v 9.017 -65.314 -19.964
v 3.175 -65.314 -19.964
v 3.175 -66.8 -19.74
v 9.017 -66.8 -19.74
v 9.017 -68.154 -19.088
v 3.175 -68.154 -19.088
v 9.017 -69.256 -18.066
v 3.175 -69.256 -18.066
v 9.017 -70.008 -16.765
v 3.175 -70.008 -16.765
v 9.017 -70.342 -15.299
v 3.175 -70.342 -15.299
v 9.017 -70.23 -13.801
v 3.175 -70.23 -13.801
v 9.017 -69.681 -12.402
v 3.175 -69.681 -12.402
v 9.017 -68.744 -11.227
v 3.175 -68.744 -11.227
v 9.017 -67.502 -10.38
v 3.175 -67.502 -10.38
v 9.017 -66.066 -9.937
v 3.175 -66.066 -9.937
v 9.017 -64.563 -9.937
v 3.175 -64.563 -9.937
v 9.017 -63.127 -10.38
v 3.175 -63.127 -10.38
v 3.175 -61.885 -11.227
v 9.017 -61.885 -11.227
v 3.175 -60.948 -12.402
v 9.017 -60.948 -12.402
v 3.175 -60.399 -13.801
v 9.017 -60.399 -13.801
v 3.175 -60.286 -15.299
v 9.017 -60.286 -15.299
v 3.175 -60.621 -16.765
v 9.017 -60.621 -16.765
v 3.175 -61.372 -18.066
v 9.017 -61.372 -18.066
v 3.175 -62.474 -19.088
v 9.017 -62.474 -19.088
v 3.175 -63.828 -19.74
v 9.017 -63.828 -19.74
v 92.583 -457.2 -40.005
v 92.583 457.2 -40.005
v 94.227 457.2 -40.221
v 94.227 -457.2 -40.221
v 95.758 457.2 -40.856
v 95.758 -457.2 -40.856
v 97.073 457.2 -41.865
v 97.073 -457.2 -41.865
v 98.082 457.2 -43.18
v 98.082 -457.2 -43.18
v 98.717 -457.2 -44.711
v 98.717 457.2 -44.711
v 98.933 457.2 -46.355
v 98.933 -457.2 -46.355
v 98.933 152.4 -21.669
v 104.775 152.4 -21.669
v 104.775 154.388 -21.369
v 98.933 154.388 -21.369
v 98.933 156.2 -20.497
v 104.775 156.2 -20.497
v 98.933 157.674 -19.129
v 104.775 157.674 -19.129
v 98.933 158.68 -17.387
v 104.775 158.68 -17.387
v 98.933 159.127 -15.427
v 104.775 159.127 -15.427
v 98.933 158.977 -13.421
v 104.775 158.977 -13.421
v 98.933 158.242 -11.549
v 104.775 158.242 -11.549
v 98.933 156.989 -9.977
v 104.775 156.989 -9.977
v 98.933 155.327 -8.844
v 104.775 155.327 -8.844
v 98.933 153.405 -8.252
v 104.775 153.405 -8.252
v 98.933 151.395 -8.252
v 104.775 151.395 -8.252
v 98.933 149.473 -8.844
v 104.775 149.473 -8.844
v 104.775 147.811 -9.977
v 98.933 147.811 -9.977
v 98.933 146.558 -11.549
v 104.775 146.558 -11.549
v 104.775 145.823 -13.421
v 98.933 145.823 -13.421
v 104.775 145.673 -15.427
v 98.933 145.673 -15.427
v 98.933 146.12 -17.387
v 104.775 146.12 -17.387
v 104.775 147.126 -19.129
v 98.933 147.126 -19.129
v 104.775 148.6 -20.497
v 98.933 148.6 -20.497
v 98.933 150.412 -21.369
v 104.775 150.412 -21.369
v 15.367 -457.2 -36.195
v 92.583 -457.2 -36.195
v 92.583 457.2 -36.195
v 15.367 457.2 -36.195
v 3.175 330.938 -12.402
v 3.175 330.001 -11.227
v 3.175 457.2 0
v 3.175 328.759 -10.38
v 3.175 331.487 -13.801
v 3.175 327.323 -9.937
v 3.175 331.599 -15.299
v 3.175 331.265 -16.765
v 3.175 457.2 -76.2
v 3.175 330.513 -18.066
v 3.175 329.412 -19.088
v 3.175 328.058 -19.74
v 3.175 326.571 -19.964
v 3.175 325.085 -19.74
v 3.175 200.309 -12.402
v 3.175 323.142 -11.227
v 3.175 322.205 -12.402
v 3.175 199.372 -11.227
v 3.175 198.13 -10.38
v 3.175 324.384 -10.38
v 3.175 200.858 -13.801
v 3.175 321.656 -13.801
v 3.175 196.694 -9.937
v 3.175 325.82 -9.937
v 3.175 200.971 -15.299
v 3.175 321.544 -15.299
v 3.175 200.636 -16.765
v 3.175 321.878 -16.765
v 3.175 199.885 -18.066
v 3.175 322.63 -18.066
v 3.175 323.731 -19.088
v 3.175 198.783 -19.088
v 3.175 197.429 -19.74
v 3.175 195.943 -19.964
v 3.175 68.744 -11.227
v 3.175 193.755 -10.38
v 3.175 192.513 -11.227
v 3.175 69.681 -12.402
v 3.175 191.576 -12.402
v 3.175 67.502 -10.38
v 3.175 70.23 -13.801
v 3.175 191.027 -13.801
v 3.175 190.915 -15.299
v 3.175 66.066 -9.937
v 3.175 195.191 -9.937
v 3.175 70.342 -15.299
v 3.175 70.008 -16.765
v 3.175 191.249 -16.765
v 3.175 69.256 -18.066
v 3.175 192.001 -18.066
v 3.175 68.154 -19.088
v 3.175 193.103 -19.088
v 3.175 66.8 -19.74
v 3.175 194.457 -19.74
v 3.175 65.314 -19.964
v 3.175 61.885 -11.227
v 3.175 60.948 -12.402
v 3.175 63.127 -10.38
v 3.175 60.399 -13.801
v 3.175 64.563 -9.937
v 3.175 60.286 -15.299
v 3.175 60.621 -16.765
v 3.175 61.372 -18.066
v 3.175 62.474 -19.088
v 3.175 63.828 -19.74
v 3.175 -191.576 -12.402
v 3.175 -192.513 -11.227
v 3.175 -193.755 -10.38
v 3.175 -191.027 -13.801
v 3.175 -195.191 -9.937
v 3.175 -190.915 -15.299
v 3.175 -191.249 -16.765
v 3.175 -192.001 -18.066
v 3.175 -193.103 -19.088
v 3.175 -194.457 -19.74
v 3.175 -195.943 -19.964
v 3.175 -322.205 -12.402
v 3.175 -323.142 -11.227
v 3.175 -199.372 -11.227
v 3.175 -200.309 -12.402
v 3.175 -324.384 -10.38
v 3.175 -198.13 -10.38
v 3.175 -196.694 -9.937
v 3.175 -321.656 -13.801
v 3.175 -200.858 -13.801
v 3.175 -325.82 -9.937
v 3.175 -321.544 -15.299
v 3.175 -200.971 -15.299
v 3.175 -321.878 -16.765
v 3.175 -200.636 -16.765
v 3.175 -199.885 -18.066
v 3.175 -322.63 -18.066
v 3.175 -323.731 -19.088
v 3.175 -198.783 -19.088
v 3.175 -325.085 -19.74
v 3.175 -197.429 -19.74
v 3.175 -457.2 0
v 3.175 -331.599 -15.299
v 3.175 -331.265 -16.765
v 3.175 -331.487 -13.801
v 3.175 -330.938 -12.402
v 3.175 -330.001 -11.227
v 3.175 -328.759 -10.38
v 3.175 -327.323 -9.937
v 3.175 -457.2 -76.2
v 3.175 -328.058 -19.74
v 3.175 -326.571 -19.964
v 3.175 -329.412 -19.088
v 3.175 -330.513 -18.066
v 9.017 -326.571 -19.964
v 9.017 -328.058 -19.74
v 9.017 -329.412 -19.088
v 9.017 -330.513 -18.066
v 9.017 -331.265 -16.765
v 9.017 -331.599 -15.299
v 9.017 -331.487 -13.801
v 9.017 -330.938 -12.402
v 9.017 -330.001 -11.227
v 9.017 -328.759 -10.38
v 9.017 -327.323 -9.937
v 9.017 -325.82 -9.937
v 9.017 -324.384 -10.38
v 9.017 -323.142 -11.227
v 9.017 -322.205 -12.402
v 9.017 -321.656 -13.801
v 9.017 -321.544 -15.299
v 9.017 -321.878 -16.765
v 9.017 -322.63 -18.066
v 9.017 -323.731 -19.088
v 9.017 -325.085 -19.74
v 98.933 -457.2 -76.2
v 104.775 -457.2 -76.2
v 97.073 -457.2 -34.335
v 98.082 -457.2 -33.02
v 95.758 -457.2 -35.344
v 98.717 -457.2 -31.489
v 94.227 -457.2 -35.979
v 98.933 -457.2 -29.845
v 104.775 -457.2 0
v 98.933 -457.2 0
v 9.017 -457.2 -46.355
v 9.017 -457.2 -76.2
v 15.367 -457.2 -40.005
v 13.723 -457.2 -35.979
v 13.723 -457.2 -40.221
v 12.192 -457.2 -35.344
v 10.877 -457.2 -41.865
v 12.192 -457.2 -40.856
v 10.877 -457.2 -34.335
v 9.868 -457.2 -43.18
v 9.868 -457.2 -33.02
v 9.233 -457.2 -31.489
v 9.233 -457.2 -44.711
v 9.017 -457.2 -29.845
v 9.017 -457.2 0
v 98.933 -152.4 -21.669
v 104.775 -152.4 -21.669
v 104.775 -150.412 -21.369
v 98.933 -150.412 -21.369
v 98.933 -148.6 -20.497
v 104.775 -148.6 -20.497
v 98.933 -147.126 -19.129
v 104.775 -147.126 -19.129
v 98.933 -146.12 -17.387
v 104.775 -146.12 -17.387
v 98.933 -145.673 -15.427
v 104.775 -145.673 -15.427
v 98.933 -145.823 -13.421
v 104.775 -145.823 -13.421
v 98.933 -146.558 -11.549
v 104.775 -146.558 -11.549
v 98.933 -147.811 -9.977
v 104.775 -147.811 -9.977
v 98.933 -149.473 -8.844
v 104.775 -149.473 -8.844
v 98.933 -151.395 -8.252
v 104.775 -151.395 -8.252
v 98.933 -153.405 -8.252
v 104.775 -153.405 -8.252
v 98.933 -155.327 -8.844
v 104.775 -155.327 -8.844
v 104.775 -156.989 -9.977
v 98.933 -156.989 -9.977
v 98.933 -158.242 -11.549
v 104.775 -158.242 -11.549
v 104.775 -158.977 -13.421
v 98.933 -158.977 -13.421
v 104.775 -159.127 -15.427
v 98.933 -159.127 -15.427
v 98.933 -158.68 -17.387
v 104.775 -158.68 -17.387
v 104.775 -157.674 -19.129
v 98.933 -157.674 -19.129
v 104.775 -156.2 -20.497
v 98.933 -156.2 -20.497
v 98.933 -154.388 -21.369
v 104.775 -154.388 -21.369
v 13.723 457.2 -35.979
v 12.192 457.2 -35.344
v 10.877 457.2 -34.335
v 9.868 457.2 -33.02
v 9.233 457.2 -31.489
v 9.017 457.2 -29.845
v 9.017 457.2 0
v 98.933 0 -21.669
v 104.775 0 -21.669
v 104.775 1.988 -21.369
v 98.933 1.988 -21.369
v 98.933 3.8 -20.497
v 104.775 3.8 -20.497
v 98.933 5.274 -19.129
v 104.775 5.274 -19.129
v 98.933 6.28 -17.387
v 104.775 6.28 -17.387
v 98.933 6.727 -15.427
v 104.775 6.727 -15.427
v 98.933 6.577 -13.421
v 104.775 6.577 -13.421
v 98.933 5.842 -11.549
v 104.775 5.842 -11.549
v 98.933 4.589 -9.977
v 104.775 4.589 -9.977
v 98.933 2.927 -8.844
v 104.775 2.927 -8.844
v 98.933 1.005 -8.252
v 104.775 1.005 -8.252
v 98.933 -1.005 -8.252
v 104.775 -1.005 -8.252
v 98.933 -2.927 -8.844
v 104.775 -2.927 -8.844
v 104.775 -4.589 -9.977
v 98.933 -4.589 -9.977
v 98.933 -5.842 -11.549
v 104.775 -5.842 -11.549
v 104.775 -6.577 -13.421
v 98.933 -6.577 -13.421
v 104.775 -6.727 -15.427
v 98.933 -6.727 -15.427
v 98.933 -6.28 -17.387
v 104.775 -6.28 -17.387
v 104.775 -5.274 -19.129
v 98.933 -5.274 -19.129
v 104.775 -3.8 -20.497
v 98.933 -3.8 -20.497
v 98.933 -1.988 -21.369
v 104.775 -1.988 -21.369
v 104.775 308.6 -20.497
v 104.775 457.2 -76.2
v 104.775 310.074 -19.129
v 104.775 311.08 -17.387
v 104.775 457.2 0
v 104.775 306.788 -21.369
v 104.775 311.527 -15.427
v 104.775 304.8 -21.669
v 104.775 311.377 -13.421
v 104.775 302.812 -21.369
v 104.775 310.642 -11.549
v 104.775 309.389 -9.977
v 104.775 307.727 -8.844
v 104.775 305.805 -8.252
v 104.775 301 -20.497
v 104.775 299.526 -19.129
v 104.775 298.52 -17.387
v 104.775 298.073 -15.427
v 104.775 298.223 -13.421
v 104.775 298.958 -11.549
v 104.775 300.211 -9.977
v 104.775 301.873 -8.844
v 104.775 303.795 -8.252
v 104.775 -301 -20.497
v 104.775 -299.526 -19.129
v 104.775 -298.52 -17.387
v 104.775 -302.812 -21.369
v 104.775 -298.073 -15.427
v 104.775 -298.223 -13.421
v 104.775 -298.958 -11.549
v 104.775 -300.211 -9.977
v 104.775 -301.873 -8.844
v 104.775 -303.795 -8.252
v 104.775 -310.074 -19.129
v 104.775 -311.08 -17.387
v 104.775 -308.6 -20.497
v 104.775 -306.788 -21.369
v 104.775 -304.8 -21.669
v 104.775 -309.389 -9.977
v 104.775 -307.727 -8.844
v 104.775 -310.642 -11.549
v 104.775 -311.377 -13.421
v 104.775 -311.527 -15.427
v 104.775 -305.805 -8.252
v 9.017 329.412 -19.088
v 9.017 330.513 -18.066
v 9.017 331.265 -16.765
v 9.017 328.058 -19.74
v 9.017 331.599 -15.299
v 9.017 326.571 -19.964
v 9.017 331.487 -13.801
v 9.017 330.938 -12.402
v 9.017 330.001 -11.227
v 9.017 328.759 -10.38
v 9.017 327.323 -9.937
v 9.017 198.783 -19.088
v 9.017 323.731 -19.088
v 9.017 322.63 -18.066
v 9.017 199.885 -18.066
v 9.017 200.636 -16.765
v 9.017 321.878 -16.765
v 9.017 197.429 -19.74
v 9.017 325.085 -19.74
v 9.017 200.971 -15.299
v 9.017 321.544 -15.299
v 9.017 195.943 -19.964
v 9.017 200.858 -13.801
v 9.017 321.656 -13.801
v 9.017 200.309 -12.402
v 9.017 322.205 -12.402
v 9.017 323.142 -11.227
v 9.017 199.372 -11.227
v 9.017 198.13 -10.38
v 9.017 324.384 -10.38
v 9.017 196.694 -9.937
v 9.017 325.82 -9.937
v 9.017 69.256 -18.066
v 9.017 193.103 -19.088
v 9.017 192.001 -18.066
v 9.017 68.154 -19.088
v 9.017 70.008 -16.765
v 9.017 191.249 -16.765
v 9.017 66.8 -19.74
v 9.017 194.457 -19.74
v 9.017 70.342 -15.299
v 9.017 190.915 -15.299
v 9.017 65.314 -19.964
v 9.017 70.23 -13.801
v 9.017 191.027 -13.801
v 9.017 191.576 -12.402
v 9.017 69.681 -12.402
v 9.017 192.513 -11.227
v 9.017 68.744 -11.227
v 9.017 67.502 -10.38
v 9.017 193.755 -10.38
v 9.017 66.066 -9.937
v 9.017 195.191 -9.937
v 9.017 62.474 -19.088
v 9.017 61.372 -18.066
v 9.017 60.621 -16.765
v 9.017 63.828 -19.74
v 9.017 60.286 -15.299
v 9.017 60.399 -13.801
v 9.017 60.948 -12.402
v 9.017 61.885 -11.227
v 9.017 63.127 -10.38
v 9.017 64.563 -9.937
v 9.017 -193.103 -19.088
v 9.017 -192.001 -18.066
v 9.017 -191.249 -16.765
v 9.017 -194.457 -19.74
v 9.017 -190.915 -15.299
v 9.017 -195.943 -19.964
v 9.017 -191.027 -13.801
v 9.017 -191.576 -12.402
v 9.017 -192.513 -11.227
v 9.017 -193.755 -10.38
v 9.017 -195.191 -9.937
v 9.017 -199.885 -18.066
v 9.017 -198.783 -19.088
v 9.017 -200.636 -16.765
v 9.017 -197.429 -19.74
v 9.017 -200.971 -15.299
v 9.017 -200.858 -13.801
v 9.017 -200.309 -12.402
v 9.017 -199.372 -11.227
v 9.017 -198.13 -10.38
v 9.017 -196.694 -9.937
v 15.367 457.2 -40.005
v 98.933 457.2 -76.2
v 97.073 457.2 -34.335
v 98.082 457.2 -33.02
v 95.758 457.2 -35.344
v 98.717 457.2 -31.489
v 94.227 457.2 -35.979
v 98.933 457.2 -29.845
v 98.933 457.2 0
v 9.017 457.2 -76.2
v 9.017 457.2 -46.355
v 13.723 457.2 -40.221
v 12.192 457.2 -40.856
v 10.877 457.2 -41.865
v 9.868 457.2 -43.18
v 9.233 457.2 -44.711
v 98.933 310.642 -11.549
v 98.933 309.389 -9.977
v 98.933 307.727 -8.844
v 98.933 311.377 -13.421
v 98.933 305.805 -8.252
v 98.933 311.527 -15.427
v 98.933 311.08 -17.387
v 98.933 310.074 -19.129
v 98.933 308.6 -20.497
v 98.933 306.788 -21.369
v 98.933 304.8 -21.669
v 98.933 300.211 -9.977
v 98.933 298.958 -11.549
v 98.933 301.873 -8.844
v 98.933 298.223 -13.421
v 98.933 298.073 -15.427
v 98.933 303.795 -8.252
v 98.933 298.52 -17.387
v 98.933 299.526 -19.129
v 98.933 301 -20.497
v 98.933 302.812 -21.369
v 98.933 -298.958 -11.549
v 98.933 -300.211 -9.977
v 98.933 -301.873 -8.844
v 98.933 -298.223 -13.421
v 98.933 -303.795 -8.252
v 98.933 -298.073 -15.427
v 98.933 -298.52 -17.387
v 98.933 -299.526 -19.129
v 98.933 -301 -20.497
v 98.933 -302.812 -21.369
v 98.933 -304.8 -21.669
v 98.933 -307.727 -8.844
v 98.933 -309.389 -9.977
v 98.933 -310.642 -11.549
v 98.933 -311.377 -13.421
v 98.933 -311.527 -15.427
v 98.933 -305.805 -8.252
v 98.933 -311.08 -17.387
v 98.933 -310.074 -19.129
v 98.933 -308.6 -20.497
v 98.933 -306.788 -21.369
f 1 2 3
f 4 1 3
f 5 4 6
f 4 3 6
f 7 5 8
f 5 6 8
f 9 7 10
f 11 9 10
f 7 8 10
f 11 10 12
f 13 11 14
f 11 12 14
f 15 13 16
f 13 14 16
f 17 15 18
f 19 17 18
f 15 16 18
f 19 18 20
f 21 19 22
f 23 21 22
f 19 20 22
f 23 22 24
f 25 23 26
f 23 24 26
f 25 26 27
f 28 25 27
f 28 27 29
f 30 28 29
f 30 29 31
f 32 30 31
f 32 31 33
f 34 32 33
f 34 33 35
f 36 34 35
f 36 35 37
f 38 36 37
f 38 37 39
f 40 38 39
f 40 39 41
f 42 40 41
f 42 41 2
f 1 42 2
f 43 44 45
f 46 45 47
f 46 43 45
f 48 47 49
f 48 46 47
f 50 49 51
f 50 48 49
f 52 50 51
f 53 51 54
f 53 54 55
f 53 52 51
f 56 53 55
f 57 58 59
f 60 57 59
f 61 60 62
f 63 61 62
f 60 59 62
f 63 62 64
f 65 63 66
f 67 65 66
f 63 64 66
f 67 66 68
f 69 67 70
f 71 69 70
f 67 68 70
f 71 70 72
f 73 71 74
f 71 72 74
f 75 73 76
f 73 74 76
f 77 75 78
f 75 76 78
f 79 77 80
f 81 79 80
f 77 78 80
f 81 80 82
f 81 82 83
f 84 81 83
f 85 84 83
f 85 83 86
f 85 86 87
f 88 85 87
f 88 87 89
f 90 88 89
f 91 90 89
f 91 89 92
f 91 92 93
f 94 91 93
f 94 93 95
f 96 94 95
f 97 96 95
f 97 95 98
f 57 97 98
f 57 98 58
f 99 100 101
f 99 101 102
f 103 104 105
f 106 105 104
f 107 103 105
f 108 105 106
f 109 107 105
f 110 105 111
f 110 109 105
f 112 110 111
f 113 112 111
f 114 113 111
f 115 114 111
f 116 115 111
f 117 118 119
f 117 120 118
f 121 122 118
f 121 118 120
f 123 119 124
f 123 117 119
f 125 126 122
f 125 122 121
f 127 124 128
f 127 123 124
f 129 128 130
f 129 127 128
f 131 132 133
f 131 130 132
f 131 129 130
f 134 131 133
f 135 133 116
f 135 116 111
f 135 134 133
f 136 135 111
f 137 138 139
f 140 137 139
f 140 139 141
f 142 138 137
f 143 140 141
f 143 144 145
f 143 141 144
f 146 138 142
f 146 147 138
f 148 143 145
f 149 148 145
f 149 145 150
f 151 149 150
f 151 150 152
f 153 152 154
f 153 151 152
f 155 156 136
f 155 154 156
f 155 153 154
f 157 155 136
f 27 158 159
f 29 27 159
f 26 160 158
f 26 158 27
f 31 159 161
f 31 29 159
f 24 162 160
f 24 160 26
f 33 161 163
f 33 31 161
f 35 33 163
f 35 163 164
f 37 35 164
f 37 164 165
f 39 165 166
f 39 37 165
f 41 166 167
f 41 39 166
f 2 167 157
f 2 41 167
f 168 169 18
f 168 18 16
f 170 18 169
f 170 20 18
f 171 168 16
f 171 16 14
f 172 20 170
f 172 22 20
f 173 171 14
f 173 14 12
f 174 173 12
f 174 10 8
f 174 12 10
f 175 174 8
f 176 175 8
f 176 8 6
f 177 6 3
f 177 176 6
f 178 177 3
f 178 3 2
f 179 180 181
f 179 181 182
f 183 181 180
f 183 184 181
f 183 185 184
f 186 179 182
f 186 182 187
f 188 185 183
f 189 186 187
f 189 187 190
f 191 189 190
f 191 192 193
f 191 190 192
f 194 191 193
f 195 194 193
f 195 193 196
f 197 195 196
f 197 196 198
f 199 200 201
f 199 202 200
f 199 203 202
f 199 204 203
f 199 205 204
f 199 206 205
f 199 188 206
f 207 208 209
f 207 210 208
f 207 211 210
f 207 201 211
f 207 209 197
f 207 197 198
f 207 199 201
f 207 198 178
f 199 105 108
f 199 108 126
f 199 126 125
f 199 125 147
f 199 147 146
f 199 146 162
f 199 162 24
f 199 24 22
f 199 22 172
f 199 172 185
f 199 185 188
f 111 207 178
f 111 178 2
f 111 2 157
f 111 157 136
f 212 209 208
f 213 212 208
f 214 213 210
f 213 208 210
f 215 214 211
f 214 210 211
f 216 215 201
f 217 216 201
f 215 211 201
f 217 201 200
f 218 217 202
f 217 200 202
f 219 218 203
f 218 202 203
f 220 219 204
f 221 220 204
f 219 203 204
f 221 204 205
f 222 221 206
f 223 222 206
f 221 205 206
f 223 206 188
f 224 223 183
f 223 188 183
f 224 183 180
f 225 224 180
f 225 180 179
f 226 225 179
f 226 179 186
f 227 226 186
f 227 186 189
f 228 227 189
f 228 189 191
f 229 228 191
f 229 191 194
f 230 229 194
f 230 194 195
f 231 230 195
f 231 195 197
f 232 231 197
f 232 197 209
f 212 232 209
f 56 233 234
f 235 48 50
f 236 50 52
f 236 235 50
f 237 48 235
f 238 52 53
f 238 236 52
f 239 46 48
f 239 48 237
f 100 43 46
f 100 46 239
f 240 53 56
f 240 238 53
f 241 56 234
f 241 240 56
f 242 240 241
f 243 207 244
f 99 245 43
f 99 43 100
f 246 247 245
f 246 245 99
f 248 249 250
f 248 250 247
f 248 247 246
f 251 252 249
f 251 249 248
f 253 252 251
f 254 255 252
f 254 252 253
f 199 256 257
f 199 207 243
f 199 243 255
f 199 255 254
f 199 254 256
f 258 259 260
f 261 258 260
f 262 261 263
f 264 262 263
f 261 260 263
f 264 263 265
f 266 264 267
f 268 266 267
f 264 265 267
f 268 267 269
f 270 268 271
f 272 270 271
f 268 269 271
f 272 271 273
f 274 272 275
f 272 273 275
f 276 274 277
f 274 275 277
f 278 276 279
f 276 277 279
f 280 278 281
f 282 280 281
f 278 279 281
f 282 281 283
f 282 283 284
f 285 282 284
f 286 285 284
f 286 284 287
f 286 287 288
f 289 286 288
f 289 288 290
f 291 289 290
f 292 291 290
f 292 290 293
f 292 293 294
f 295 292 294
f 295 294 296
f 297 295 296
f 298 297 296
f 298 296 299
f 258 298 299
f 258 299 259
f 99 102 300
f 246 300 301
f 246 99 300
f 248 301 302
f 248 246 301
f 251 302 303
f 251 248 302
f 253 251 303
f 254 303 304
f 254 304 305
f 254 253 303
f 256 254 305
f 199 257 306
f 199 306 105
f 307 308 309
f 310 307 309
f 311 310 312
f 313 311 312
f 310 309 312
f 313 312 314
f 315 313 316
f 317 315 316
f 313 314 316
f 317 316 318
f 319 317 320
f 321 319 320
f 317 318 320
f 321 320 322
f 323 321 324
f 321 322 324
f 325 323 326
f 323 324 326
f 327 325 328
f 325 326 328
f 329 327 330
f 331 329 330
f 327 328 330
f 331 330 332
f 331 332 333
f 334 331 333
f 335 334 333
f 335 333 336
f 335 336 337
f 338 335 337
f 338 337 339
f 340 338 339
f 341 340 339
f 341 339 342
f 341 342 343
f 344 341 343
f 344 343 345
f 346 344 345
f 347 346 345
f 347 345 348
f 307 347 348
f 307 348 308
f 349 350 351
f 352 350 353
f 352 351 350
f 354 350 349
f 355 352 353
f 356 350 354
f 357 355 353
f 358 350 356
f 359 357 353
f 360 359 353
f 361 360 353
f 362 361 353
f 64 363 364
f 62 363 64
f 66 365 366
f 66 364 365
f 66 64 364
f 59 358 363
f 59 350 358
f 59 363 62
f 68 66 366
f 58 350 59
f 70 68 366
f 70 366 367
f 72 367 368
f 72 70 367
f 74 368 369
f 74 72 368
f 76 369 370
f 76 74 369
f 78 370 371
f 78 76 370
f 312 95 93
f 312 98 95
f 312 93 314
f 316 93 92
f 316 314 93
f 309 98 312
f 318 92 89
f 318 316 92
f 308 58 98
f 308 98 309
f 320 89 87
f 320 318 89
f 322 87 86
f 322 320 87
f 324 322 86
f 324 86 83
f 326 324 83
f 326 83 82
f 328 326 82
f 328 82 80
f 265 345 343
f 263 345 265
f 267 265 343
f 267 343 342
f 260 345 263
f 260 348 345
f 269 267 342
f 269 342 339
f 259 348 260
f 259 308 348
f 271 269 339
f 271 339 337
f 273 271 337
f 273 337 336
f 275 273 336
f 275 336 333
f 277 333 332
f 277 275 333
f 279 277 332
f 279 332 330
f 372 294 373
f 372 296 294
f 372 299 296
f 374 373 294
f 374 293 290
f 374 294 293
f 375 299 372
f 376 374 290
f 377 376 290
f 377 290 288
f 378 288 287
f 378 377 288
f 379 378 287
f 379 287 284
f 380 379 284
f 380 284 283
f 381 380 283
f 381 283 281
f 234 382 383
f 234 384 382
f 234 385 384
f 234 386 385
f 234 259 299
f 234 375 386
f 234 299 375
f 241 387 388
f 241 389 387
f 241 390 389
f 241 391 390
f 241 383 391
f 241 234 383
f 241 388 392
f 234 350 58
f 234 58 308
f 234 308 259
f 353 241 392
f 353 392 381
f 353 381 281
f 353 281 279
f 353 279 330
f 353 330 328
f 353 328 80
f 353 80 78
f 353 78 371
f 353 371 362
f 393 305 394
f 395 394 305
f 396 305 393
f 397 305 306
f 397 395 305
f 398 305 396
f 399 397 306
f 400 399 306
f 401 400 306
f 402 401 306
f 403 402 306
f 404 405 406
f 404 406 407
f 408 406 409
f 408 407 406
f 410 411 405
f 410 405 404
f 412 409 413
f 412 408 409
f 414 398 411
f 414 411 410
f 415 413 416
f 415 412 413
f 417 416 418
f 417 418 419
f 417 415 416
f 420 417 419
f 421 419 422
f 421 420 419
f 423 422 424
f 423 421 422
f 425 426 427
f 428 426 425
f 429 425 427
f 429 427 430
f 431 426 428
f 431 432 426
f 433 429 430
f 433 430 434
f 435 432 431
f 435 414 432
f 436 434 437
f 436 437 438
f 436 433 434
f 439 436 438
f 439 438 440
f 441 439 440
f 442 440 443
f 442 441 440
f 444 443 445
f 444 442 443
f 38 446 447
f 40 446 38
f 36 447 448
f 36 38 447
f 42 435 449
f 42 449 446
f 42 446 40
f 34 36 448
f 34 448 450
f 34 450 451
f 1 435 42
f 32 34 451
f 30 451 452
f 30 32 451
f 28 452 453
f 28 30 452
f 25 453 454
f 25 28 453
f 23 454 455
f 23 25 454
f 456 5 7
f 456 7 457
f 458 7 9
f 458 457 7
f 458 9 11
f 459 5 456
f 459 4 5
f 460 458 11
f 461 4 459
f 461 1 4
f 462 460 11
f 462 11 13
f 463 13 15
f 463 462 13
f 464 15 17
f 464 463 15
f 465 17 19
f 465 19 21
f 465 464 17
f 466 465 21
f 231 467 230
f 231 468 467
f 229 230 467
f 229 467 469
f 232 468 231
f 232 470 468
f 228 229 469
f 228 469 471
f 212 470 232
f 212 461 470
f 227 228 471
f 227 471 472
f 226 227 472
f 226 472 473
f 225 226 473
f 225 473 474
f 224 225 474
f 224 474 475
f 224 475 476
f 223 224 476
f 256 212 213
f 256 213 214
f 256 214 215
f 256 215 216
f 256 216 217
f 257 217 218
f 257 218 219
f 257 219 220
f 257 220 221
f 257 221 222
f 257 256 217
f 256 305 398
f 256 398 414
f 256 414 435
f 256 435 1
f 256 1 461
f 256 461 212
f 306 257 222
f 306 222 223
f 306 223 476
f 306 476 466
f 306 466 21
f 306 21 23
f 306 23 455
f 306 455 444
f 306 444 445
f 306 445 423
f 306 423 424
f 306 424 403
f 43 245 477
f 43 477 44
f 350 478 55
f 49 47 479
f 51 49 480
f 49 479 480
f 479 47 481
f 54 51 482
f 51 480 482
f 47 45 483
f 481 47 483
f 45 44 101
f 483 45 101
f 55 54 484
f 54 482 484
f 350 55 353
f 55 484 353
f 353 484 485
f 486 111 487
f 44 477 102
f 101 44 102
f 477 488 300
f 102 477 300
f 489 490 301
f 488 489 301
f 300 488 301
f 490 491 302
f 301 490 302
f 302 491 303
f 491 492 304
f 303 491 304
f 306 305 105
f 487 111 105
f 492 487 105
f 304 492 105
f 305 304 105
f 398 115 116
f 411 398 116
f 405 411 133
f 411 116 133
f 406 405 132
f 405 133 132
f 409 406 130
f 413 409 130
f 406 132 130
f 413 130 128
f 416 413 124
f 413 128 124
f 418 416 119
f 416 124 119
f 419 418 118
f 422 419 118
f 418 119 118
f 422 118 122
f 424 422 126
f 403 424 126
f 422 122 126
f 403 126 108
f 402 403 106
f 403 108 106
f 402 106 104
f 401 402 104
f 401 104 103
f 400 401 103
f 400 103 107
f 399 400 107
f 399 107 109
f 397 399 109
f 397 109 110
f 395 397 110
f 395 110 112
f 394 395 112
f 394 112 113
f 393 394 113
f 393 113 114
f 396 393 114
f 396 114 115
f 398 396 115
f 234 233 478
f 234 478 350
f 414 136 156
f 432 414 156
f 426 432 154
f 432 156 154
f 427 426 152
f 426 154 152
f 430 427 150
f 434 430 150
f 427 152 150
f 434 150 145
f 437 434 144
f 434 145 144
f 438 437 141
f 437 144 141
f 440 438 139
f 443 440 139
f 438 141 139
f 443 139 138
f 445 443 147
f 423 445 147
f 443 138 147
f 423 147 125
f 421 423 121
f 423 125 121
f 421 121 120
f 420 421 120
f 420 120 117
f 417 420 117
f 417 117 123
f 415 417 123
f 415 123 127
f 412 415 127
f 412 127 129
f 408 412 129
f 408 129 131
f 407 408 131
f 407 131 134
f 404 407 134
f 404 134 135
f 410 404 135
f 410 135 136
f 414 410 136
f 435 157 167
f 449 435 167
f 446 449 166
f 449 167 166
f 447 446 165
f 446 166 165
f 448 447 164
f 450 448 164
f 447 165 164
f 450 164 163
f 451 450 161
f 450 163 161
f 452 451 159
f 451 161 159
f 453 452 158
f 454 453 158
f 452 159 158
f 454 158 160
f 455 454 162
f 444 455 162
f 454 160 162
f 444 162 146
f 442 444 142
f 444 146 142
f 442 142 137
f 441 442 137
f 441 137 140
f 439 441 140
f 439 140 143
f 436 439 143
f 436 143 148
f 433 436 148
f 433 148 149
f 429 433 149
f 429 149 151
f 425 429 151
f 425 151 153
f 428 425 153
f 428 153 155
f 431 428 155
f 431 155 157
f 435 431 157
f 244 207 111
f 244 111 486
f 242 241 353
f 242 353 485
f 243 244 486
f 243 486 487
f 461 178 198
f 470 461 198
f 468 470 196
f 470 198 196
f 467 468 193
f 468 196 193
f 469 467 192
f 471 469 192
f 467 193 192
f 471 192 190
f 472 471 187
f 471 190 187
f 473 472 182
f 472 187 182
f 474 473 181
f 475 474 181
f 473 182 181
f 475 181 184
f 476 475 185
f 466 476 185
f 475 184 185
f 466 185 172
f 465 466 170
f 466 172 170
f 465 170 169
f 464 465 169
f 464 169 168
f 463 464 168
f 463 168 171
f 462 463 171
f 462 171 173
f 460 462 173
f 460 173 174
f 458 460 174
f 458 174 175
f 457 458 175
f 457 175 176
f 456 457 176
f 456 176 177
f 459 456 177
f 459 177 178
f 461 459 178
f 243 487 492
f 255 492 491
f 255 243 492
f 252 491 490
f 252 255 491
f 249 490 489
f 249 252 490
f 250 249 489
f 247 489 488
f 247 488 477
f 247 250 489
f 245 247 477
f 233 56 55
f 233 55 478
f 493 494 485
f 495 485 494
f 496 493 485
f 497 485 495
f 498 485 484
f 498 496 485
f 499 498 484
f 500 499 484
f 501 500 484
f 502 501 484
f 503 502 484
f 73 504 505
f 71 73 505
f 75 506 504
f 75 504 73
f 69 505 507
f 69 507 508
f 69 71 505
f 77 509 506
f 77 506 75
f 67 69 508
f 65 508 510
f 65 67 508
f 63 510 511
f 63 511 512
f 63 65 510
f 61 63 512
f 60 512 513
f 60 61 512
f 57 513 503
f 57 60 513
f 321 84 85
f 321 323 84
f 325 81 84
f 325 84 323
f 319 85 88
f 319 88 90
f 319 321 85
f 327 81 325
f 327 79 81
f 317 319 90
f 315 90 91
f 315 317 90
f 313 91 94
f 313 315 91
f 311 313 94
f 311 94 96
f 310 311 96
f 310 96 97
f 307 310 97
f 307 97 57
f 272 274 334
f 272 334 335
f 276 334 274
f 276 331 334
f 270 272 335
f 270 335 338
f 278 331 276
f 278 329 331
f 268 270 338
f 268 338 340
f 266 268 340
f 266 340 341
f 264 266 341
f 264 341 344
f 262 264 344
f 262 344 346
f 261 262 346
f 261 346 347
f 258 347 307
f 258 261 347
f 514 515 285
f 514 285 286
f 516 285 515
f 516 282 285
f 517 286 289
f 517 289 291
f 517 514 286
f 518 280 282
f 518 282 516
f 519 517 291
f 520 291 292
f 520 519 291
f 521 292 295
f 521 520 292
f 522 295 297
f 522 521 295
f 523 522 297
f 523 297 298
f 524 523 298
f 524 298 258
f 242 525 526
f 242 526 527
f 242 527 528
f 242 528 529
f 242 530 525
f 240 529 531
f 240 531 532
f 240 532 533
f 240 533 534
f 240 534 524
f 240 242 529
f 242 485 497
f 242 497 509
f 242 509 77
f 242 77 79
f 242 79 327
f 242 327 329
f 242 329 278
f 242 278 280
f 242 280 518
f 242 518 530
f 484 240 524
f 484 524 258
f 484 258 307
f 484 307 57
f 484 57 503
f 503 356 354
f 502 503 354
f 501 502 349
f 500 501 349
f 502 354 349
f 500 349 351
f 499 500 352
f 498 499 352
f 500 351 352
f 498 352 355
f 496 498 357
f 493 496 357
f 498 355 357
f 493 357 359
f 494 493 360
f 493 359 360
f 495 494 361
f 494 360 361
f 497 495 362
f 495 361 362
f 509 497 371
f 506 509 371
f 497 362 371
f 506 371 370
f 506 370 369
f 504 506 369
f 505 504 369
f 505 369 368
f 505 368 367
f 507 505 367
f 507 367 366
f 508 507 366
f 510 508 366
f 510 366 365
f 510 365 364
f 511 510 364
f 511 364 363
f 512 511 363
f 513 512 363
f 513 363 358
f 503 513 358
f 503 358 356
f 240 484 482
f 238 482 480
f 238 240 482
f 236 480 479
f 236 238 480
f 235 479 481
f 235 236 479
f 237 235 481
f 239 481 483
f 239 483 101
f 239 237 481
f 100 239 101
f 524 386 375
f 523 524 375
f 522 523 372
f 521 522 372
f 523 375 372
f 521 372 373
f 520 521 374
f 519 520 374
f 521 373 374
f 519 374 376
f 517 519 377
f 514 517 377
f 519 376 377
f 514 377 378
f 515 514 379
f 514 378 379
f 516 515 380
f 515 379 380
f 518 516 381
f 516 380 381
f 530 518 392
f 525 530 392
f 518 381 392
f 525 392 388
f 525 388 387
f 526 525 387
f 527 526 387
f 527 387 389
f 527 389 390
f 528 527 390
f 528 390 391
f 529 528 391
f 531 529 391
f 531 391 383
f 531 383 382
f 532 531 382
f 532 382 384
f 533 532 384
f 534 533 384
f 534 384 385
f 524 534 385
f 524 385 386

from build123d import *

# Parameters (mm, degrees)
AL_I_BEAM_AL_I_BEAM_4X2_31_4_DEPTH = 914.4
F_3_8_CLEARANCE_HOLE1_REACH        = 476.511
F_3_8_CLEARANCE_HOLE1_BORE_R       = 5.0419
F_1_2_CLEARANCE_HOLE1_D            = 13.49248
F_1_2_CLEARANCE_HOLE1_DEPTH        = 5.842


with BuildPart() as part:
    # Sketch11 → Al i beam AL I BEAM 4X2.31(4) (new body)
    with BuildSketch(Plane(origin=(53.975, -457.2, -38.1), x_dir=(0, 0, -1), z_dir=(0, 1, 0))):
        with BuildLine():
            Line((-38.1, -50.8), (-38.1, -44.958))
            Line((-38.1, -44.958), (-8.255, -44.958))
            ThreePointArc((-8.255, -44.958), (-3.764871939, -43.098128061), (-1.905, -38.608))
            Line((-1.905, -38.608), (-1.905, 38.608))
            ThreePointArc((-1.905, 38.608), (-3.764871939, 43.098128061), (-8.255, 44.958))
            Line((-8.255, 44.958), (-38.1, 44.958))
            Line((-38.1, 44.958), (-38.1, 50.8))
            Line((-38.1, 50.8), (38.1, 50.8))
            Line((38.1, 50.8), (38.1, 44.958))
            Line((38.1, 44.958), (8.255, 44.958))
            ThreePointArc((8.255, 44.958), (3.764871939, 43.098128061), (1.905, 38.608))
            Line((1.905, 38.608), (1.905, -38.608))
            ThreePointArc((1.905, -38.608), (3.764871939, -43.098128061), (8.255, -44.958))
            Line((8.255, -44.958), (38.1, -44.958))
            Line((38.1, -44.958), (38.1, -50.8))
            Line((38.1, -50.8), (-38.1, -50.8))
        make_face()
    extrude(amount=AL_I_BEAM_AL_I_BEAM_4X2_31_4_DEPTH)

    # 3/8 Clearance Hole1 bore → 3/8 Clearance Hole1 (cut, up to next)
    with BuildSketch(Plane(origin=(3.175, 0, 0), x_dir=(0, 0, -1), z_dir=(-1, 0, 0)), mode=Mode.PRIVATE) as f_3_8_clearance_hole1_sk1:
        with Locations((14.9225, -326.571428209)):
            Circle(F_3_8_CLEARANCE_HOLE1_BORE_R)
    f_3_8_clearance_hole1_tool1 = extrude(f_3_8_clearance_hole1_sk1.sketch, amount=-F_3_8_CLEARANCE_HOLE1_REACH, mode=Mode.PRIVATE) & part.part
    # 3/8 Clearance Hole1 bore → 3/8 Clearance Hole1 (cut, up to next)
    with BuildSketch(Plane(origin=(3.175, 0, 0), x_dir=(0, 0, -1), z_dir=(-1, 0, 0)), mode=Mode.PRIVATE) as f_3_8_clearance_hole1_sk2:
        with Locations((14.9225, 326.571428571)):
            Circle(F_3_8_CLEARANCE_HOLE1_BORE_R)
    f_3_8_clearance_hole1_tool2 = extrude(f_3_8_clearance_hole1_sk2.sketch, amount=-F_3_8_CLEARANCE_HOLE1_REACH, mode=Mode.PRIVATE) & part.part
    # 3/8 Clearance Hole1 bore → 3/8 Clearance Hole1 (cut, up to next)
    with BuildSketch(Plane(origin=(3.175, 0, 0), x_dir=(0, 0, -1), z_dir=(-1, 0, 0)), mode=Mode.PRIVATE) as f_3_8_clearance_hole1_sk3:
        with Locations((14.9225, 195.942857215)):
            Circle(F_3_8_CLEARANCE_HOLE1_BORE_R)
    f_3_8_clearance_hole1_tool3 = extrude(f_3_8_clearance_hole1_sk3.sketch, amount=-F_3_8_CLEARANCE_HOLE1_REACH, mode=Mode.PRIVATE) & part.part
    # 3/8 Clearance Hole1 bore → 3/8 Clearance Hole1 (cut, up to next)
    with BuildSketch(Plane(origin=(3.175, 0, 0), x_dir=(0, 0, -1), z_dir=(-1, 0, 0)), mode=Mode.PRIVATE) as f_3_8_clearance_hole1_sk4:
        with Locations((14.9225, 65.314285859)):
            Circle(F_3_8_CLEARANCE_HOLE1_BORE_R)
    f_3_8_clearance_hole1_tool4 = extrude(f_3_8_clearance_hole1_sk4.sketch, amount=-F_3_8_CLEARANCE_HOLE1_REACH, mode=Mode.PRIVATE) & part.part
    # 3/8 Clearance Hole1 bore → 3/8 Clearance Hole1 (cut, up to next)
    with BuildSketch(Plane(origin=(3.175, 0, 0), x_dir=(0, 0, -1), z_dir=(-1, 0, 0)), mode=Mode.PRIVATE) as f_3_8_clearance_hole1_sk5:
        with Locations((14.9225, -65.314285497)):
            Circle(F_3_8_CLEARANCE_HOLE1_BORE_R)
    f_3_8_clearance_hole1_tool5 = extrude(f_3_8_clearance_hole1_sk5.sketch, amount=-F_3_8_CLEARANCE_HOLE1_REACH, mode=Mode.PRIVATE) & part.part
    # 3/8 Clearance Hole1 bore → 3/8 Clearance Hole1 (cut, up to next)
    with BuildSketch(Plane(origin=(3.175, 0, 0), x_dir=(0, 0, -1), z_dir=(-1, 0, 0)), mode=Mode.PRIVATE) as f_3_8_clearance_hole1_sk6:
        with Locations((14.9225, -195.942856853)):
            Circle(F_3_8_CLEARANCE_HOLE1_BORE_R)
    f_3_8_clearance_hole1_tool6 = extrude(f_3_8_clearance_hole1_sk6.sketch, amount=-F_3_8_CLEARANCE_HOLE1_REACH, mode=Mode.PRIVATE) & part.part
    add(f_3_8_clearance_hole1_tool1.solids().sort_by_distance((3.175, 326.571428, -14.9225))[0], mode=Mode.SUBTRACT)
    add(f_3_8_clearance_hole1_tool2.solids().sort_by_distance((3.175, -326.571429, -14.9225))[0], mode=Mode.SUBTRACT)
    add(f_3_8_clearance_hole1_tool3.solids().sort_by_distance((3.175, -195.942857, -14.9225))[0], mode=Mode.SUBTRACT)
    add(f_3_8_clearance_hole1_tool4.solids().sort_by_distance((3.175, -65.314286, -14.9225))[0], mode=Mode.SUBTRACT)
    add(f_3_8_clearance_hole1_tool5.solids().sort_by_distance((3.175, 65.314285, -14.9225))[0], mode=Mode.SUBTRACT)
    add(f_3_8_clearance_hole1_tool6.solids().sort_by_distance((3.175, 195.942857, -14.9225))[0], mode=Mode.SUBTRACT)

    # 1/2 Clearance Hole1
    with Locations(Plane.ZY.offset(-98.933)):
        with Locations((-14.9225, 304.8), (-14.9225, -304.8), (-14.9225, -152.4), (-14.9225, 0), (-14.9225, 152.4)):
            Hole(F_1_2_CLEARANCE_HOLE1_D / 2, depth=F_1_2_CLEARANCE_HOLE1_DEPTH)


solid = part.part
